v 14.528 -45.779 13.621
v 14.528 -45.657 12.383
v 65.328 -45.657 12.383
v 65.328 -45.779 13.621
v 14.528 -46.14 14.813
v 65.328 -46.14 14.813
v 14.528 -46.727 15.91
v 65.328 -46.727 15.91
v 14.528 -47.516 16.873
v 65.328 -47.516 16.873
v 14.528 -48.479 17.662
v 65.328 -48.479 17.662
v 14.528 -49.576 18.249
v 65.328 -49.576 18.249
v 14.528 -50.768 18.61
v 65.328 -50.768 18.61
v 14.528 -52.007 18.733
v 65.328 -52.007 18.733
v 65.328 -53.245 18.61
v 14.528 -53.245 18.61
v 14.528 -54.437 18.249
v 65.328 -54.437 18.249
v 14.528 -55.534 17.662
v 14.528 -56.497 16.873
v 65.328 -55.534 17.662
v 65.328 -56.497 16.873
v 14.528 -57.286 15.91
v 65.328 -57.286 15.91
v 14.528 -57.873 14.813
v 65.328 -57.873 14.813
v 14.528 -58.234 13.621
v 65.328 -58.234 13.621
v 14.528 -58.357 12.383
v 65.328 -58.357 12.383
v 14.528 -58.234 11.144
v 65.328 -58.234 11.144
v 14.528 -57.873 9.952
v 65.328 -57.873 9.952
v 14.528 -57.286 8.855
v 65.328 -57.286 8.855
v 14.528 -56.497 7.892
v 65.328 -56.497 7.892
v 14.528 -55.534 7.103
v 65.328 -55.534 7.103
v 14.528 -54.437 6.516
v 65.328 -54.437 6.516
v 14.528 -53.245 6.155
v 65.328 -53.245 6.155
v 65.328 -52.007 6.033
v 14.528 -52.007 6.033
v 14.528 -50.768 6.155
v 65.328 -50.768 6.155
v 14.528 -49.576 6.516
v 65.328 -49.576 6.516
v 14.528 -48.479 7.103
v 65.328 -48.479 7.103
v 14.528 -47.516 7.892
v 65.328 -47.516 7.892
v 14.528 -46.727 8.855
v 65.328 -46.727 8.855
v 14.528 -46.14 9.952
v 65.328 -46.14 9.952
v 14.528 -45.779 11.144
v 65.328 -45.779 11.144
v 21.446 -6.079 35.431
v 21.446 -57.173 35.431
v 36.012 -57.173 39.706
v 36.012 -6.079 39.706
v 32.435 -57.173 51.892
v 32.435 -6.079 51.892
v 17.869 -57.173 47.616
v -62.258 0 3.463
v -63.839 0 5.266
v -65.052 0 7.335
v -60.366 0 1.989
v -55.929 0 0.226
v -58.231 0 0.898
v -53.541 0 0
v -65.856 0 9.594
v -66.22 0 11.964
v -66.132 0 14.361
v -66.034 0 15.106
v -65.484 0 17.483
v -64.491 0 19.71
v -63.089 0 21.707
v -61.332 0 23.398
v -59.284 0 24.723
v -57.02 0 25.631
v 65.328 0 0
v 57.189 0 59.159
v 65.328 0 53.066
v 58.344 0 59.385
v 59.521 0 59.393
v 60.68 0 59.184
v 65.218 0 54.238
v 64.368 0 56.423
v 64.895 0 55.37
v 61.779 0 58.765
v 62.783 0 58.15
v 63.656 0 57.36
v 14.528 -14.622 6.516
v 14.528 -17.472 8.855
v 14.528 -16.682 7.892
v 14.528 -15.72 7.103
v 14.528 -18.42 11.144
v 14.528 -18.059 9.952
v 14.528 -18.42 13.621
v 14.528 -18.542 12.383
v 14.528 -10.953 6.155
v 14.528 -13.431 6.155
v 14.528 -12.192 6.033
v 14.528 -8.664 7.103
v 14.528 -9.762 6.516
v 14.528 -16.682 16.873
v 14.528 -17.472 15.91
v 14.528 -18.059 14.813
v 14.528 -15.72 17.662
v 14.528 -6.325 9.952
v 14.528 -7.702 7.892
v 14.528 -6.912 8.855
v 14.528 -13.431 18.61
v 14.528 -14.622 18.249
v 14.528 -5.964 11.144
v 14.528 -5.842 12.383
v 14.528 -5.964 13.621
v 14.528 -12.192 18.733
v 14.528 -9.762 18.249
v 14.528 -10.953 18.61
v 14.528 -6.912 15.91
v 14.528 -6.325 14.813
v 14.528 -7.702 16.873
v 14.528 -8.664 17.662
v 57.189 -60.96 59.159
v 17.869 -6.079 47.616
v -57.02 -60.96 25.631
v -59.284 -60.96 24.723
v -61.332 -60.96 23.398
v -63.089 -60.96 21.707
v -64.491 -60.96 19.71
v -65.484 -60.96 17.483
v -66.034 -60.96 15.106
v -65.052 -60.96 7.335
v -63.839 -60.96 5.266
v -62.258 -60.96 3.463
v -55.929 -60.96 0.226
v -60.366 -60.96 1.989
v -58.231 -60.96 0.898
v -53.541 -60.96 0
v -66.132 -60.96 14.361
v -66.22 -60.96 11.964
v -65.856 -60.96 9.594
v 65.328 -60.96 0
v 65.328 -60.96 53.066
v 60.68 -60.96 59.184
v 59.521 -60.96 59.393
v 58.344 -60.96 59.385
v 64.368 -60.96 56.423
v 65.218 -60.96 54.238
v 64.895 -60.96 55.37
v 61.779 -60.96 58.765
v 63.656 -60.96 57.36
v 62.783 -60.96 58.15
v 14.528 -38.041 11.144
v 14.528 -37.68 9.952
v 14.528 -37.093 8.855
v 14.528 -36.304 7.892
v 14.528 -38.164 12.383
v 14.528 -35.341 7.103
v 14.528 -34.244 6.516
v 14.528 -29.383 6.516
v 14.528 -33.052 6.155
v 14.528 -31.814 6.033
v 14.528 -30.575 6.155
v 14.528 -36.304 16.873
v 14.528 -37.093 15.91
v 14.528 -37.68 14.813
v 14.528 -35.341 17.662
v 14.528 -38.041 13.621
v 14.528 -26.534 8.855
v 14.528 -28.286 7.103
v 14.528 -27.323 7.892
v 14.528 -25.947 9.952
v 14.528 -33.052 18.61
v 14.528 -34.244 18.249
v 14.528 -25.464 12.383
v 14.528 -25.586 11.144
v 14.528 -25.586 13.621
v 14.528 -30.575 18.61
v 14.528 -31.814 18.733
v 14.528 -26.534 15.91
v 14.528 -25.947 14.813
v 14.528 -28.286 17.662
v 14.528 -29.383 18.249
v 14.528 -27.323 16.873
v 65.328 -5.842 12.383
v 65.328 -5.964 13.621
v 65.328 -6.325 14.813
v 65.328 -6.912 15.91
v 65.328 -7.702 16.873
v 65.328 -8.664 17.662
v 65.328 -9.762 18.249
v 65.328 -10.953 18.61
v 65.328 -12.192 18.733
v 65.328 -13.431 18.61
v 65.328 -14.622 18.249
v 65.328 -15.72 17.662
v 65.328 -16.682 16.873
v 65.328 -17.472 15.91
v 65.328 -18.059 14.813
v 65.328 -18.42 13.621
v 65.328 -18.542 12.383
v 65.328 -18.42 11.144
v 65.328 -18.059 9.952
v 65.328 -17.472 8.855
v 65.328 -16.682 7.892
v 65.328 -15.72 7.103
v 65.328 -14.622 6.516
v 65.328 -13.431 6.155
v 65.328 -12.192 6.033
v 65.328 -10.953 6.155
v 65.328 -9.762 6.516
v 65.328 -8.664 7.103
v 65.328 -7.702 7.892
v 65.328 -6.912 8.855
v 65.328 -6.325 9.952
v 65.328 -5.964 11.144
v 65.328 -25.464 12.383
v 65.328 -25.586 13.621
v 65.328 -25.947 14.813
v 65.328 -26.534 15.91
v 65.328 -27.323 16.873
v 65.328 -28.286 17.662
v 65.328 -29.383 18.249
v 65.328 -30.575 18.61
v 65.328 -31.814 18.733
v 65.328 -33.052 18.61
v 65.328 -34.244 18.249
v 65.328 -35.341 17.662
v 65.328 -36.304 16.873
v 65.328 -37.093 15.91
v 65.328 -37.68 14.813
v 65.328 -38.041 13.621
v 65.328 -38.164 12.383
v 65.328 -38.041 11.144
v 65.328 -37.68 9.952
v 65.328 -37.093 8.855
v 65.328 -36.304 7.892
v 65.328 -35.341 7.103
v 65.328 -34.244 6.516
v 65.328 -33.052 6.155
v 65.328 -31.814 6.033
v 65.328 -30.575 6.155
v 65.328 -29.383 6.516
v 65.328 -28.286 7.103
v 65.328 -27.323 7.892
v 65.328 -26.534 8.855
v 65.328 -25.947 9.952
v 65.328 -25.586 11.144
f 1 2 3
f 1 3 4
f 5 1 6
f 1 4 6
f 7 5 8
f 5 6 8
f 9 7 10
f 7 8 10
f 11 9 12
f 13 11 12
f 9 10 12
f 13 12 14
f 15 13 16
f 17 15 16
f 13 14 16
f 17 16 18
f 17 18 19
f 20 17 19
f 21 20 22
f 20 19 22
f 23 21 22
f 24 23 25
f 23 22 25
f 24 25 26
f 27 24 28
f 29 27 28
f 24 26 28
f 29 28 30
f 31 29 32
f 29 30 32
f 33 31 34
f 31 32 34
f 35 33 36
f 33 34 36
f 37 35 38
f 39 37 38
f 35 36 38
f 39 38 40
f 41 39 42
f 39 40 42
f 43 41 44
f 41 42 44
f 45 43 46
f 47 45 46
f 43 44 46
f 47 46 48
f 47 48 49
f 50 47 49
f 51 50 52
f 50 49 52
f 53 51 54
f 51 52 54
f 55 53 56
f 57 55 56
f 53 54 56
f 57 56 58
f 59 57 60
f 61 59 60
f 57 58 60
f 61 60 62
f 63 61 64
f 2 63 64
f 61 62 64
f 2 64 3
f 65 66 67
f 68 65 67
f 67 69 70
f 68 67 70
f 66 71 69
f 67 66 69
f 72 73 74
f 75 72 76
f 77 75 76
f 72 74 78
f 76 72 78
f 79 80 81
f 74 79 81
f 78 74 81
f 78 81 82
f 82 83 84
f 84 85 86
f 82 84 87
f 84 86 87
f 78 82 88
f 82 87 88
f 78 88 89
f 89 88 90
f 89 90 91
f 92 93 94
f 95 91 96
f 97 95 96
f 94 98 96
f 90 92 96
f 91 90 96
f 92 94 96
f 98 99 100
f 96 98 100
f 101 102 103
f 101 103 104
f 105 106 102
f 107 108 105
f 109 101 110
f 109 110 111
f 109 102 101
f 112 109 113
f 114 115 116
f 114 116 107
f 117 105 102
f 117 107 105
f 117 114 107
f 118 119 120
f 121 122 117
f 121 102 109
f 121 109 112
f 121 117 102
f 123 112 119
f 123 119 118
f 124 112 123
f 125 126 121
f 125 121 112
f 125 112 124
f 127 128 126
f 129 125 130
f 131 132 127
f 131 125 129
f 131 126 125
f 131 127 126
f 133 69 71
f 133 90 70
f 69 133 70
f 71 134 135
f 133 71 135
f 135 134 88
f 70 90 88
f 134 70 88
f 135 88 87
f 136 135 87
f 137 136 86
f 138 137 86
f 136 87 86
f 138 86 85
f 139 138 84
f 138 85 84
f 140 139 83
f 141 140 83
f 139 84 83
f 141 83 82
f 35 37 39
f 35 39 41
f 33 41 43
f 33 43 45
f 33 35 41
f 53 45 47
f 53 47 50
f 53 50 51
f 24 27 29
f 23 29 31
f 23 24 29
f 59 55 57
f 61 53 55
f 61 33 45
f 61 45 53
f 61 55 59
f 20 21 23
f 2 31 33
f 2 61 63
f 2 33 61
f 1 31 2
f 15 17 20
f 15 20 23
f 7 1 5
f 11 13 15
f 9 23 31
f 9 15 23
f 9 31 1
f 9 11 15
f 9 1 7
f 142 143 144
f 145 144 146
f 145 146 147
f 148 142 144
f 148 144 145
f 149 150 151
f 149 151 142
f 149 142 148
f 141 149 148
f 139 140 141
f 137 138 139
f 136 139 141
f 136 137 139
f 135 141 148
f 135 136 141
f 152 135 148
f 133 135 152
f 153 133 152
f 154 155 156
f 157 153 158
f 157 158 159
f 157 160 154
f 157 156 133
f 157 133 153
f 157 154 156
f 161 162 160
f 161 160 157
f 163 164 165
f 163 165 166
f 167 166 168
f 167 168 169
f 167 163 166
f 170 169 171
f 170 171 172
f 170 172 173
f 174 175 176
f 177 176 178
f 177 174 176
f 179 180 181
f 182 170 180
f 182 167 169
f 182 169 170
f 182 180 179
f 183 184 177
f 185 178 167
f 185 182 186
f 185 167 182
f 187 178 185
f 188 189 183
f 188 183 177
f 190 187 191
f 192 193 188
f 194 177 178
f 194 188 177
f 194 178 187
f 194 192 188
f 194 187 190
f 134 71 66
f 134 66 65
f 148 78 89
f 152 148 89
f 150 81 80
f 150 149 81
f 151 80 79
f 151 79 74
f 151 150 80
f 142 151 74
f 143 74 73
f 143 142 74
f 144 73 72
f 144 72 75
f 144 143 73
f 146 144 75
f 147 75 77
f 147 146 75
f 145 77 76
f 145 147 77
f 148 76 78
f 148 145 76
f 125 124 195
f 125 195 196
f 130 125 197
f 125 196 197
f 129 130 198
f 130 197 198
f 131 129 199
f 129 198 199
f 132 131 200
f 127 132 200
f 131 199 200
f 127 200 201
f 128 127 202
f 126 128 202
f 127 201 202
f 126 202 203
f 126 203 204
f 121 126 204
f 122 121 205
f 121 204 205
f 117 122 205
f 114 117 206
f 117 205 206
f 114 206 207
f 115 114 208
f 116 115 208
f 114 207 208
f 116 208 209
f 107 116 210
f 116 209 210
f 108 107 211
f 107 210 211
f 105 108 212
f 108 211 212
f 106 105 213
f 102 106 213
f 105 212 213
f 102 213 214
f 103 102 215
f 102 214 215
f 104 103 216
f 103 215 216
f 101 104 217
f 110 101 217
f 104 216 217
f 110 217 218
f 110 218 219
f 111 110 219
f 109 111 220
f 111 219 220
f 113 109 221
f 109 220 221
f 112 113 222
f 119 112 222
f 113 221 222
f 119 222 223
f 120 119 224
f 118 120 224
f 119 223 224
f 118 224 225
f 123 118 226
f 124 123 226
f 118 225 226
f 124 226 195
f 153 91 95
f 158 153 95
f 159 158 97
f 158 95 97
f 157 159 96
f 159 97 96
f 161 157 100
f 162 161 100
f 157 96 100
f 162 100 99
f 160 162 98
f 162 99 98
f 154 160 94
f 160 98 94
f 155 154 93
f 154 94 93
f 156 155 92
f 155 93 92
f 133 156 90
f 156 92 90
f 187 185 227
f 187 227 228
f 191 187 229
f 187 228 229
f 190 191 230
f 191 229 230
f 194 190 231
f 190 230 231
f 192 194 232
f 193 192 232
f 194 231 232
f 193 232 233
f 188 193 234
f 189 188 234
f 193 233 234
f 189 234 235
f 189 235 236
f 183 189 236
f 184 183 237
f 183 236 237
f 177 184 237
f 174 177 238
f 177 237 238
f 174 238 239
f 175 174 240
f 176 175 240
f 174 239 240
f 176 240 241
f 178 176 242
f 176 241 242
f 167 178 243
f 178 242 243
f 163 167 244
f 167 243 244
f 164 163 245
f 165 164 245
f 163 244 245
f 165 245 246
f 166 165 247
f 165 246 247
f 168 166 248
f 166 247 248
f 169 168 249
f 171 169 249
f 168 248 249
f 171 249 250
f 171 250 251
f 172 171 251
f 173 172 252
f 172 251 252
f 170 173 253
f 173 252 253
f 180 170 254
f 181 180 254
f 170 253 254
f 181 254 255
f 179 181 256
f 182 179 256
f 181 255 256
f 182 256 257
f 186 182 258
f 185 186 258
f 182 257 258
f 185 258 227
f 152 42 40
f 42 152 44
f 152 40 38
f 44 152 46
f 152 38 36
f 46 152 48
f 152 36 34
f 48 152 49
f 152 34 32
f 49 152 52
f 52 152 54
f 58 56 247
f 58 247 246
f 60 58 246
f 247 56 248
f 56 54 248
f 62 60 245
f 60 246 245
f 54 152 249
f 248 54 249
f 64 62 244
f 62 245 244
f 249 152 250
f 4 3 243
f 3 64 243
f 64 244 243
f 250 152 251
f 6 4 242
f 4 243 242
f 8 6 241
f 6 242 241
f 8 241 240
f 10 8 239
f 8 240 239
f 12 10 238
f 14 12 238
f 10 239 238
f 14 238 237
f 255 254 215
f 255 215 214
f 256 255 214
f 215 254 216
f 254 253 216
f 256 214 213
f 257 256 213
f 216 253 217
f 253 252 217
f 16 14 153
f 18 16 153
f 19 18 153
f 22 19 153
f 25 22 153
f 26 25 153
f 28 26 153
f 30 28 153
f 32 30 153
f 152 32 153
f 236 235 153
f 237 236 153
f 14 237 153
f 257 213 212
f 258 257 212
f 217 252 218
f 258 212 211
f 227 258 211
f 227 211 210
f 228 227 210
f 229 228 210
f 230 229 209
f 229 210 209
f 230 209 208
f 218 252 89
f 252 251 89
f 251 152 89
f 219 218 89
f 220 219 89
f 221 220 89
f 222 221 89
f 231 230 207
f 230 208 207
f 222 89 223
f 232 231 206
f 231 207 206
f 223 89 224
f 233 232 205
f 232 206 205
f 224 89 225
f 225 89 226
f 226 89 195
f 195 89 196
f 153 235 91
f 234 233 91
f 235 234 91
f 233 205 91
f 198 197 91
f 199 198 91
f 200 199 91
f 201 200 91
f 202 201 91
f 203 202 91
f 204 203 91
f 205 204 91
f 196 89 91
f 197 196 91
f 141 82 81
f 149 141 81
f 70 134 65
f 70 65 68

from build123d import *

# Parameters (mm, degrees)
F1_DEPTH = 60.96
F2_W     = 15.180191
F2_H     = 51.094524
F3_DEPTH = 12.7
F4_R     = 12.7
F5_R     = 6.35
F6_DEPTH = 50.8


with BuildPart() as f1:
    # F0 (on Front) → F1 (new body)
    with BuildSketch(Plane.XZ):
        with BuildLine():
            Line((-66.034004, 15.106326), (-68.026364, 0))
            Line((-68.026364, 0), (65.327539, 0))
            Line((65.327539, 0), (65.327539, 53.066271))
            ThreePointArc((65.327539, 53.066271), (62.7831, 58.149598), (57.18889, 59.159155))
            Line((57.18889, 59.159155), (-57.020338, 25.631483))
            ThreePointArc((-57.020338, 25.631483), (-63.089174, 21.706593), (-66.034004, 15.106326))
        make_face()
    extrude(amount=F1_DEPTH)

    # F2 (on face) → F3 (cut)
    with BuildSketch(Plane(origin=(-11.451568, 0, 39.008815), x_dir=(0.959509, 0, 0.281677), z_dir=(-0.281677, 0, 0.959509))):
        with Locations((38.148094, -31.626057)):
            Rectangle(F2_W, F2_H)
    extrude(amount=-F3_DEPTH, mode=Mode.SUBTRACT)

    # F4
    f4_edges = [f1.edges().sort_by_distance(p)[0] for p in [
        (-68.026364, -30.48, 0),
    ]]
    fillet(f4_edges, radius=F4_R)

    # F5 (on face) → F6 (cut)
    with BuildSketch(Plane.YZ.offset(65.327539)):
        with Locations((-52.006502, 12.382501)):
            Circle(F5_R)
        with Locations((-31.813502, 12.382501)):
            Circle(F5_R)
        with Locations((-12.192, 12.382501)):
            Circle(F5_R)
    extrude(amount=-F6_DEPTH, mode=Mode.SUBTRACT)


solid = f1.part
